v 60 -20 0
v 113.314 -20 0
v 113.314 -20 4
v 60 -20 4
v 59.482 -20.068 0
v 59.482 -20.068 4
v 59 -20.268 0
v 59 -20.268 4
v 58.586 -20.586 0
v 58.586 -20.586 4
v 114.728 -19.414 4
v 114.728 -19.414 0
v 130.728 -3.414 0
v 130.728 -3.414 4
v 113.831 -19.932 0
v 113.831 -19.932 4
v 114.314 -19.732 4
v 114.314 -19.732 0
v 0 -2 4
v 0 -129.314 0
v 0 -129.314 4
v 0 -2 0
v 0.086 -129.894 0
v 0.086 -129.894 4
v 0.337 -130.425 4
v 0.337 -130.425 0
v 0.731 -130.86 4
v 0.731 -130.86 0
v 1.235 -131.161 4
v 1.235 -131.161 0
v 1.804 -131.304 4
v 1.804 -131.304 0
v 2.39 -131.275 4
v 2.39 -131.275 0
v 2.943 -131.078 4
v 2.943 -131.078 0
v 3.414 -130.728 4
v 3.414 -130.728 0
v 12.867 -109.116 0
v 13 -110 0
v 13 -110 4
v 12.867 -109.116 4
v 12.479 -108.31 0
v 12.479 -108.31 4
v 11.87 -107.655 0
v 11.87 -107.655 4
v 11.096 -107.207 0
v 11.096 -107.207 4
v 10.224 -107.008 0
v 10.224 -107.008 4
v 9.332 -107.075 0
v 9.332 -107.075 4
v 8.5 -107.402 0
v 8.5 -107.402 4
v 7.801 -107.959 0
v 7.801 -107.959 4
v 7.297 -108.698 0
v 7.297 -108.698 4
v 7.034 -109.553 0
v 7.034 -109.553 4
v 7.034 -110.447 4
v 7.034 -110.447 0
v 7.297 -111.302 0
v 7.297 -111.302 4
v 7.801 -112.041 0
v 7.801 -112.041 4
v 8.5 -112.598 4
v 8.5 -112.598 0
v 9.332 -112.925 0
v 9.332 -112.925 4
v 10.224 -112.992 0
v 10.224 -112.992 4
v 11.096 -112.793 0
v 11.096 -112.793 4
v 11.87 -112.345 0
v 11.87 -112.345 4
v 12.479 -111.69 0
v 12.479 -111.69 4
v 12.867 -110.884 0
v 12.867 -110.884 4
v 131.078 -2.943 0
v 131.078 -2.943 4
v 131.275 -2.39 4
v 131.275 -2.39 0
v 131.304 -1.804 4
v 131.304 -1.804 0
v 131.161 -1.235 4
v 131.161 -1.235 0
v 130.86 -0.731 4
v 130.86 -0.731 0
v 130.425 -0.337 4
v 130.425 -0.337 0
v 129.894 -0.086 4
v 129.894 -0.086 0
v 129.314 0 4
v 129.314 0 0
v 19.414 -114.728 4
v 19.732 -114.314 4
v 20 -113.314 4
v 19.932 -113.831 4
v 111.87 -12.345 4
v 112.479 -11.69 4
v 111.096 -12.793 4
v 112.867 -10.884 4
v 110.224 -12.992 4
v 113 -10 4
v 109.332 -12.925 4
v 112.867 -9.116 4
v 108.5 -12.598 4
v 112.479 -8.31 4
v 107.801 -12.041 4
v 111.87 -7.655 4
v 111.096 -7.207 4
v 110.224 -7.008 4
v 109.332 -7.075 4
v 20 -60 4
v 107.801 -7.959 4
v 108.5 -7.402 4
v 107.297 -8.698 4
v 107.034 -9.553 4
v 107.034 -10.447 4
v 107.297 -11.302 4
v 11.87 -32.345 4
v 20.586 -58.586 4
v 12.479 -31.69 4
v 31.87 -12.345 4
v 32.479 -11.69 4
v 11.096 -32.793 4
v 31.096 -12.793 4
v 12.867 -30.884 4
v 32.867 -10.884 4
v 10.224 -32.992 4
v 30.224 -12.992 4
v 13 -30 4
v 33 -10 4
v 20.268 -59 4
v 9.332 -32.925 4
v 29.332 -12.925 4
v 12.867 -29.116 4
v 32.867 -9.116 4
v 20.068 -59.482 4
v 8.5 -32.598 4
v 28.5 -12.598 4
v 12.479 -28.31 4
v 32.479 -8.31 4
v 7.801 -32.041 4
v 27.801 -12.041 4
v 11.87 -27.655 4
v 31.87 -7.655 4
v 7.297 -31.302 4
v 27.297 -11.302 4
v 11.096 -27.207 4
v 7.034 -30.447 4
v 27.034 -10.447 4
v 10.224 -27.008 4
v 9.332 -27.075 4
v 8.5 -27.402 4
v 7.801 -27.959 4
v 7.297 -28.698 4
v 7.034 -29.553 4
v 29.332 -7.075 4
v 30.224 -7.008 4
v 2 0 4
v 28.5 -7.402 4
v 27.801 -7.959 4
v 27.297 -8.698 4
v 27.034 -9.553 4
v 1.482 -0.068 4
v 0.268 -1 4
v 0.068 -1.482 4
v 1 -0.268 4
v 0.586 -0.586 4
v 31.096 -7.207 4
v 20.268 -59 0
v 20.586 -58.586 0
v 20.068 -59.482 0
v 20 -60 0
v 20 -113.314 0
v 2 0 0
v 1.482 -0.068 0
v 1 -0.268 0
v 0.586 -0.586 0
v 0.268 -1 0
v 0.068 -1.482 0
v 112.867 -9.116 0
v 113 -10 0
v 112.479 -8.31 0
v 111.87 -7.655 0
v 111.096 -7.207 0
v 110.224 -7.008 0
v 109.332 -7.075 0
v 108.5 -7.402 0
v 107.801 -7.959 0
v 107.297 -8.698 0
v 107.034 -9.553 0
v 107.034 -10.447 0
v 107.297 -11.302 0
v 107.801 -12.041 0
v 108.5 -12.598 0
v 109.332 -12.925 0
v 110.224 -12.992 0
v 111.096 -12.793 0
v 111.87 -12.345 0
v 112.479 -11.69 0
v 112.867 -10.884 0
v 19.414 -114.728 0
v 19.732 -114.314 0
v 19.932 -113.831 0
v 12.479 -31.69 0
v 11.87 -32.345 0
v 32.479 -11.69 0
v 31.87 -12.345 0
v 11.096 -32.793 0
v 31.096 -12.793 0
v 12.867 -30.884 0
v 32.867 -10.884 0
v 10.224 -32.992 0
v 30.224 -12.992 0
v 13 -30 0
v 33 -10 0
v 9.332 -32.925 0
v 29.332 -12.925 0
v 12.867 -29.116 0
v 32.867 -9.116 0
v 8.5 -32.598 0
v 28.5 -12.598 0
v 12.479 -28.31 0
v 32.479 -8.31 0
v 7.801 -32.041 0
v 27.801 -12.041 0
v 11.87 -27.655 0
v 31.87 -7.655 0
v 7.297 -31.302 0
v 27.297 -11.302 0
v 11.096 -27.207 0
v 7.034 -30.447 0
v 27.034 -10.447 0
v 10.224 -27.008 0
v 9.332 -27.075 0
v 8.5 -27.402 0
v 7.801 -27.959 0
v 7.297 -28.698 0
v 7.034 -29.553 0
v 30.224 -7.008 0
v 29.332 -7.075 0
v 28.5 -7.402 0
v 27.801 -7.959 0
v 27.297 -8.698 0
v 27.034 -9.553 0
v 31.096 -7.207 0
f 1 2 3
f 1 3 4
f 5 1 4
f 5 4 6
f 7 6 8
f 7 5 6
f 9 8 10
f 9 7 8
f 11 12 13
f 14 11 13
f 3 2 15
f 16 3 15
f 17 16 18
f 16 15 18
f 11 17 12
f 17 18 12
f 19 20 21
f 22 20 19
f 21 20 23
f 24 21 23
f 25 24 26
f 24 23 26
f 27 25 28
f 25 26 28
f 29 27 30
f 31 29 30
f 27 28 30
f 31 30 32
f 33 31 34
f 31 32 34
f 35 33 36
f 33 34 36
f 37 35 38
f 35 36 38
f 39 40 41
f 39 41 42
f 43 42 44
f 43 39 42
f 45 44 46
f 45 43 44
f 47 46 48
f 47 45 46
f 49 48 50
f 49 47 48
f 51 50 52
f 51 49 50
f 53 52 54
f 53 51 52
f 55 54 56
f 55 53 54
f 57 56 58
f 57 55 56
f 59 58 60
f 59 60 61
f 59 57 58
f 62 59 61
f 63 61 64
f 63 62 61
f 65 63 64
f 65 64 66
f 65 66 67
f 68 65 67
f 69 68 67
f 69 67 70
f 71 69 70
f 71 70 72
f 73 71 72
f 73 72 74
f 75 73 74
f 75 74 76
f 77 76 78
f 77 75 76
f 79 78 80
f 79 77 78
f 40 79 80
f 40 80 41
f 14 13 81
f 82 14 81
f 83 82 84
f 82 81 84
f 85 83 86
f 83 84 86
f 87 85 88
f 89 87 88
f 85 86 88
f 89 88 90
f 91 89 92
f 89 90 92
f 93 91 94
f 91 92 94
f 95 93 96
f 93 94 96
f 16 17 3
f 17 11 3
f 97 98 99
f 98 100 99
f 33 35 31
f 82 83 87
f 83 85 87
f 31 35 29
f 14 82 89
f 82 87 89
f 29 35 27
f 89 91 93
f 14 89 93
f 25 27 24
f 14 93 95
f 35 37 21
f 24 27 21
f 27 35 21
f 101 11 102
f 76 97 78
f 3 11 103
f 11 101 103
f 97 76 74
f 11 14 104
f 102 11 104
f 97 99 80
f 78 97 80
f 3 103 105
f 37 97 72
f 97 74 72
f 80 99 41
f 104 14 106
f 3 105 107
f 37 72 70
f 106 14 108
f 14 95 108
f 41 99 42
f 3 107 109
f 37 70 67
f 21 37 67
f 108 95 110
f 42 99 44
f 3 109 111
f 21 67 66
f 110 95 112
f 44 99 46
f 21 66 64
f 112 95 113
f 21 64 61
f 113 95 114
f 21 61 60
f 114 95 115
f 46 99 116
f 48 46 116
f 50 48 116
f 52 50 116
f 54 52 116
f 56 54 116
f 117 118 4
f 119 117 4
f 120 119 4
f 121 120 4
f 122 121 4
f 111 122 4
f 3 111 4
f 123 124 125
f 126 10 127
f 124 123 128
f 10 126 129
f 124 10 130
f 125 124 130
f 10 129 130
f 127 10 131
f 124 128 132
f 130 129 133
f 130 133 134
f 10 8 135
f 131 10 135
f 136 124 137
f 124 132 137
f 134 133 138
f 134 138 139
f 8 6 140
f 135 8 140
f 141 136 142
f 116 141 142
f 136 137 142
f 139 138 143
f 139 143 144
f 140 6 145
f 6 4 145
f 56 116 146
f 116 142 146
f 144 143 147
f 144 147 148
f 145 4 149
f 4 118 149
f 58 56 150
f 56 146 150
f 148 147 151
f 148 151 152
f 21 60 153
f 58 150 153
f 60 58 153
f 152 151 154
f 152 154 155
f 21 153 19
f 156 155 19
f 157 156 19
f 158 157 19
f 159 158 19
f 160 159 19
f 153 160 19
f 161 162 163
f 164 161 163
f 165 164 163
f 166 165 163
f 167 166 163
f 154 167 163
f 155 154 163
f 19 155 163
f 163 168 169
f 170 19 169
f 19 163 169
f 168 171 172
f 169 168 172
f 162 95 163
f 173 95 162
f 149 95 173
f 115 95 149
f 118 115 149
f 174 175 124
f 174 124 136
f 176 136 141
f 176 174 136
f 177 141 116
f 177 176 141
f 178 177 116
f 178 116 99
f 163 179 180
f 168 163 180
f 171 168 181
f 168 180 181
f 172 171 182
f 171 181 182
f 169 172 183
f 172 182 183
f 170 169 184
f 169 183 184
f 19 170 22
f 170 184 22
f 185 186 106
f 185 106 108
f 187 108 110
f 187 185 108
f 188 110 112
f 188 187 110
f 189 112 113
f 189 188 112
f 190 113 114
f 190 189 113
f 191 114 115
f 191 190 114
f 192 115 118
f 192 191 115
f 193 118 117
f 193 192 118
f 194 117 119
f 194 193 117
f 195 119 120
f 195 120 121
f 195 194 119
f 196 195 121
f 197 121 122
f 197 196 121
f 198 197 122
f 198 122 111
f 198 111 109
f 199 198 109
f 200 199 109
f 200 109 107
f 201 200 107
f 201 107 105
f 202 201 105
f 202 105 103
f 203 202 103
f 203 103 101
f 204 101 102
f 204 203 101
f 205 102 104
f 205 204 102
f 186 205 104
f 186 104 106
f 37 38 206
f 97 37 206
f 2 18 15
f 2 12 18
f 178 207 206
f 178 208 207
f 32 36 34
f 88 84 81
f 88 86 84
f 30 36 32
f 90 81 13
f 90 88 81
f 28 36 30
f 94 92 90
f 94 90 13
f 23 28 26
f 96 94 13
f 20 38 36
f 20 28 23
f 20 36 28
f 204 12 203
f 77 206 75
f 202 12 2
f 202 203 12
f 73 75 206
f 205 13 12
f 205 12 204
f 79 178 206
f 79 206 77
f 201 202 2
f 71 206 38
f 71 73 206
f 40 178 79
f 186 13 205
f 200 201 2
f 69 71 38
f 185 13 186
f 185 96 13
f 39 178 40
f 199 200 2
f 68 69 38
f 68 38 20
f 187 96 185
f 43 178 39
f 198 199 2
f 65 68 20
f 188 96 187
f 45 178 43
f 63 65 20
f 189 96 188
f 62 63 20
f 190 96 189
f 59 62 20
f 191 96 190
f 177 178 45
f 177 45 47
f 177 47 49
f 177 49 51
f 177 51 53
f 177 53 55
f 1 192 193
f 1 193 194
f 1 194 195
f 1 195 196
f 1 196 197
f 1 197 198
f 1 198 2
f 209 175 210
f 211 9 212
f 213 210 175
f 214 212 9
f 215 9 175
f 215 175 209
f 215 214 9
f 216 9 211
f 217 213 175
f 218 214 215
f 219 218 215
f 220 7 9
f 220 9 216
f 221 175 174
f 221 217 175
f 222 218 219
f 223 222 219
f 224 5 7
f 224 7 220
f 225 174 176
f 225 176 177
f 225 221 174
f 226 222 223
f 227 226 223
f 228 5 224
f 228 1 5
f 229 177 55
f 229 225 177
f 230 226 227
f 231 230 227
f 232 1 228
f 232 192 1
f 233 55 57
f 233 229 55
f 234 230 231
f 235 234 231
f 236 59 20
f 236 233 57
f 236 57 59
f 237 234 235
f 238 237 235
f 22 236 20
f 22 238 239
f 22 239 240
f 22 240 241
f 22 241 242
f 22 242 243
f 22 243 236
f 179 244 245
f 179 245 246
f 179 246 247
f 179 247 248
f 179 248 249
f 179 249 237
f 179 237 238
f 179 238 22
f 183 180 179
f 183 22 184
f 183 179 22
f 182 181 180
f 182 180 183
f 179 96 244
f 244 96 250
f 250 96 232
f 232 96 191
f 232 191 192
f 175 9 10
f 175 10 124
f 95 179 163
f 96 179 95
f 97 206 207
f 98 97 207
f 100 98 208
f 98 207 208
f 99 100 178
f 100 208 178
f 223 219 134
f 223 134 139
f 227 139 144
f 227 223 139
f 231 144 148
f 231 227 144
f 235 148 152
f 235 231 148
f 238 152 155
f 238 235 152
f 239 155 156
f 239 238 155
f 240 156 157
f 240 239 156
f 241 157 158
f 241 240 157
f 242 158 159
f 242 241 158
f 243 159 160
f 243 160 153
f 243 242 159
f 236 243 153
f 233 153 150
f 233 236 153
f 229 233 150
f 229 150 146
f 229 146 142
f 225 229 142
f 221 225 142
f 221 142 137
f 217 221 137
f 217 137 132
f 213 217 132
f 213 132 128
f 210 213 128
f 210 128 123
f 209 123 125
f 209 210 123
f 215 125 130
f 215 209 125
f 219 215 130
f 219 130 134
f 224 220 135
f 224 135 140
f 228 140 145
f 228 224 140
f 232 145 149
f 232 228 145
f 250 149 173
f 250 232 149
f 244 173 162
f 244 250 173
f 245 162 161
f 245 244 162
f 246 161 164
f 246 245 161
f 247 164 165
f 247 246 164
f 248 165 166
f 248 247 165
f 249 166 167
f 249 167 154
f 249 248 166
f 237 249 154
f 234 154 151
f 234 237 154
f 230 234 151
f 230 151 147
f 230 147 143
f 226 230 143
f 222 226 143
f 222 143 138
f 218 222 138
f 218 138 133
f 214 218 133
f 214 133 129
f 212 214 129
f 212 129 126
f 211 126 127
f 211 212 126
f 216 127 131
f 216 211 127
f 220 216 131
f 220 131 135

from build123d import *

# Parameters (mm, degrees)
SKETCH_R  = 3
PAD_DEPTH = 4


with BuildPart() as part:
    # Sketch → Pad (new body)
    with BuildSketch(Plane.XY):
        with BuildLine():
            Line((2, 0), (129.313708, 0))
            ThreePointArc((130.727922, -3.414214), (131.161468, -1.234633), (129.313708, 0))
            Line((114.727922, -19.414214), (130.727922, -3.414214))
            ThreePointArc((113.313708, -20), (114.079075, -19.847759), (114.727922, -19.414214))
            Line((113.313708, -20), (60, -20))
            ThreePointArc((60, -20), (59.234633, -20.152241), (58.585786, -20.585786))
            Line((58.585786, -20.585786), (20.585786, -58.585786))
            ThreePointArc((20.585786, -58.585786), (20.152241, -59.234633), (20, -60))
            Line((20, -60), (20, -113.313708))
            ThreePointArc((19.414214, -114.727922), (19.847759, -114.079075), (20, -113.313708))
            Line((3.414214, -130.727922), (19.414214, -114.727922))
            ThreePointArc((0, -129.313708), (1.234633, -131.161468), (3.414214, -130.727922))
            Line((0, -129.313708), (0, -2))
            ThreePointArc((2, 0), (0.585786, -0.585786), (0, -2))
        make_face()
        with Locations((10, -110)):
            Circle(SKETCH_R, mode=Mode.SUBTRACT)
        with Locations((110, -10)):
            Circle(SKETCH_R, mode=Mode.SUBTRACT)
        with Locations((10, -30)):
            Circle(SKETCH_R, mode=Mode.SUBTRACT)
        with Locations((30, -10)):
            Circle(SKETCH_R, mode=Mode.SUBTRACT)
    extrude(amount=PAD_DEPTH)


solid = part.part
